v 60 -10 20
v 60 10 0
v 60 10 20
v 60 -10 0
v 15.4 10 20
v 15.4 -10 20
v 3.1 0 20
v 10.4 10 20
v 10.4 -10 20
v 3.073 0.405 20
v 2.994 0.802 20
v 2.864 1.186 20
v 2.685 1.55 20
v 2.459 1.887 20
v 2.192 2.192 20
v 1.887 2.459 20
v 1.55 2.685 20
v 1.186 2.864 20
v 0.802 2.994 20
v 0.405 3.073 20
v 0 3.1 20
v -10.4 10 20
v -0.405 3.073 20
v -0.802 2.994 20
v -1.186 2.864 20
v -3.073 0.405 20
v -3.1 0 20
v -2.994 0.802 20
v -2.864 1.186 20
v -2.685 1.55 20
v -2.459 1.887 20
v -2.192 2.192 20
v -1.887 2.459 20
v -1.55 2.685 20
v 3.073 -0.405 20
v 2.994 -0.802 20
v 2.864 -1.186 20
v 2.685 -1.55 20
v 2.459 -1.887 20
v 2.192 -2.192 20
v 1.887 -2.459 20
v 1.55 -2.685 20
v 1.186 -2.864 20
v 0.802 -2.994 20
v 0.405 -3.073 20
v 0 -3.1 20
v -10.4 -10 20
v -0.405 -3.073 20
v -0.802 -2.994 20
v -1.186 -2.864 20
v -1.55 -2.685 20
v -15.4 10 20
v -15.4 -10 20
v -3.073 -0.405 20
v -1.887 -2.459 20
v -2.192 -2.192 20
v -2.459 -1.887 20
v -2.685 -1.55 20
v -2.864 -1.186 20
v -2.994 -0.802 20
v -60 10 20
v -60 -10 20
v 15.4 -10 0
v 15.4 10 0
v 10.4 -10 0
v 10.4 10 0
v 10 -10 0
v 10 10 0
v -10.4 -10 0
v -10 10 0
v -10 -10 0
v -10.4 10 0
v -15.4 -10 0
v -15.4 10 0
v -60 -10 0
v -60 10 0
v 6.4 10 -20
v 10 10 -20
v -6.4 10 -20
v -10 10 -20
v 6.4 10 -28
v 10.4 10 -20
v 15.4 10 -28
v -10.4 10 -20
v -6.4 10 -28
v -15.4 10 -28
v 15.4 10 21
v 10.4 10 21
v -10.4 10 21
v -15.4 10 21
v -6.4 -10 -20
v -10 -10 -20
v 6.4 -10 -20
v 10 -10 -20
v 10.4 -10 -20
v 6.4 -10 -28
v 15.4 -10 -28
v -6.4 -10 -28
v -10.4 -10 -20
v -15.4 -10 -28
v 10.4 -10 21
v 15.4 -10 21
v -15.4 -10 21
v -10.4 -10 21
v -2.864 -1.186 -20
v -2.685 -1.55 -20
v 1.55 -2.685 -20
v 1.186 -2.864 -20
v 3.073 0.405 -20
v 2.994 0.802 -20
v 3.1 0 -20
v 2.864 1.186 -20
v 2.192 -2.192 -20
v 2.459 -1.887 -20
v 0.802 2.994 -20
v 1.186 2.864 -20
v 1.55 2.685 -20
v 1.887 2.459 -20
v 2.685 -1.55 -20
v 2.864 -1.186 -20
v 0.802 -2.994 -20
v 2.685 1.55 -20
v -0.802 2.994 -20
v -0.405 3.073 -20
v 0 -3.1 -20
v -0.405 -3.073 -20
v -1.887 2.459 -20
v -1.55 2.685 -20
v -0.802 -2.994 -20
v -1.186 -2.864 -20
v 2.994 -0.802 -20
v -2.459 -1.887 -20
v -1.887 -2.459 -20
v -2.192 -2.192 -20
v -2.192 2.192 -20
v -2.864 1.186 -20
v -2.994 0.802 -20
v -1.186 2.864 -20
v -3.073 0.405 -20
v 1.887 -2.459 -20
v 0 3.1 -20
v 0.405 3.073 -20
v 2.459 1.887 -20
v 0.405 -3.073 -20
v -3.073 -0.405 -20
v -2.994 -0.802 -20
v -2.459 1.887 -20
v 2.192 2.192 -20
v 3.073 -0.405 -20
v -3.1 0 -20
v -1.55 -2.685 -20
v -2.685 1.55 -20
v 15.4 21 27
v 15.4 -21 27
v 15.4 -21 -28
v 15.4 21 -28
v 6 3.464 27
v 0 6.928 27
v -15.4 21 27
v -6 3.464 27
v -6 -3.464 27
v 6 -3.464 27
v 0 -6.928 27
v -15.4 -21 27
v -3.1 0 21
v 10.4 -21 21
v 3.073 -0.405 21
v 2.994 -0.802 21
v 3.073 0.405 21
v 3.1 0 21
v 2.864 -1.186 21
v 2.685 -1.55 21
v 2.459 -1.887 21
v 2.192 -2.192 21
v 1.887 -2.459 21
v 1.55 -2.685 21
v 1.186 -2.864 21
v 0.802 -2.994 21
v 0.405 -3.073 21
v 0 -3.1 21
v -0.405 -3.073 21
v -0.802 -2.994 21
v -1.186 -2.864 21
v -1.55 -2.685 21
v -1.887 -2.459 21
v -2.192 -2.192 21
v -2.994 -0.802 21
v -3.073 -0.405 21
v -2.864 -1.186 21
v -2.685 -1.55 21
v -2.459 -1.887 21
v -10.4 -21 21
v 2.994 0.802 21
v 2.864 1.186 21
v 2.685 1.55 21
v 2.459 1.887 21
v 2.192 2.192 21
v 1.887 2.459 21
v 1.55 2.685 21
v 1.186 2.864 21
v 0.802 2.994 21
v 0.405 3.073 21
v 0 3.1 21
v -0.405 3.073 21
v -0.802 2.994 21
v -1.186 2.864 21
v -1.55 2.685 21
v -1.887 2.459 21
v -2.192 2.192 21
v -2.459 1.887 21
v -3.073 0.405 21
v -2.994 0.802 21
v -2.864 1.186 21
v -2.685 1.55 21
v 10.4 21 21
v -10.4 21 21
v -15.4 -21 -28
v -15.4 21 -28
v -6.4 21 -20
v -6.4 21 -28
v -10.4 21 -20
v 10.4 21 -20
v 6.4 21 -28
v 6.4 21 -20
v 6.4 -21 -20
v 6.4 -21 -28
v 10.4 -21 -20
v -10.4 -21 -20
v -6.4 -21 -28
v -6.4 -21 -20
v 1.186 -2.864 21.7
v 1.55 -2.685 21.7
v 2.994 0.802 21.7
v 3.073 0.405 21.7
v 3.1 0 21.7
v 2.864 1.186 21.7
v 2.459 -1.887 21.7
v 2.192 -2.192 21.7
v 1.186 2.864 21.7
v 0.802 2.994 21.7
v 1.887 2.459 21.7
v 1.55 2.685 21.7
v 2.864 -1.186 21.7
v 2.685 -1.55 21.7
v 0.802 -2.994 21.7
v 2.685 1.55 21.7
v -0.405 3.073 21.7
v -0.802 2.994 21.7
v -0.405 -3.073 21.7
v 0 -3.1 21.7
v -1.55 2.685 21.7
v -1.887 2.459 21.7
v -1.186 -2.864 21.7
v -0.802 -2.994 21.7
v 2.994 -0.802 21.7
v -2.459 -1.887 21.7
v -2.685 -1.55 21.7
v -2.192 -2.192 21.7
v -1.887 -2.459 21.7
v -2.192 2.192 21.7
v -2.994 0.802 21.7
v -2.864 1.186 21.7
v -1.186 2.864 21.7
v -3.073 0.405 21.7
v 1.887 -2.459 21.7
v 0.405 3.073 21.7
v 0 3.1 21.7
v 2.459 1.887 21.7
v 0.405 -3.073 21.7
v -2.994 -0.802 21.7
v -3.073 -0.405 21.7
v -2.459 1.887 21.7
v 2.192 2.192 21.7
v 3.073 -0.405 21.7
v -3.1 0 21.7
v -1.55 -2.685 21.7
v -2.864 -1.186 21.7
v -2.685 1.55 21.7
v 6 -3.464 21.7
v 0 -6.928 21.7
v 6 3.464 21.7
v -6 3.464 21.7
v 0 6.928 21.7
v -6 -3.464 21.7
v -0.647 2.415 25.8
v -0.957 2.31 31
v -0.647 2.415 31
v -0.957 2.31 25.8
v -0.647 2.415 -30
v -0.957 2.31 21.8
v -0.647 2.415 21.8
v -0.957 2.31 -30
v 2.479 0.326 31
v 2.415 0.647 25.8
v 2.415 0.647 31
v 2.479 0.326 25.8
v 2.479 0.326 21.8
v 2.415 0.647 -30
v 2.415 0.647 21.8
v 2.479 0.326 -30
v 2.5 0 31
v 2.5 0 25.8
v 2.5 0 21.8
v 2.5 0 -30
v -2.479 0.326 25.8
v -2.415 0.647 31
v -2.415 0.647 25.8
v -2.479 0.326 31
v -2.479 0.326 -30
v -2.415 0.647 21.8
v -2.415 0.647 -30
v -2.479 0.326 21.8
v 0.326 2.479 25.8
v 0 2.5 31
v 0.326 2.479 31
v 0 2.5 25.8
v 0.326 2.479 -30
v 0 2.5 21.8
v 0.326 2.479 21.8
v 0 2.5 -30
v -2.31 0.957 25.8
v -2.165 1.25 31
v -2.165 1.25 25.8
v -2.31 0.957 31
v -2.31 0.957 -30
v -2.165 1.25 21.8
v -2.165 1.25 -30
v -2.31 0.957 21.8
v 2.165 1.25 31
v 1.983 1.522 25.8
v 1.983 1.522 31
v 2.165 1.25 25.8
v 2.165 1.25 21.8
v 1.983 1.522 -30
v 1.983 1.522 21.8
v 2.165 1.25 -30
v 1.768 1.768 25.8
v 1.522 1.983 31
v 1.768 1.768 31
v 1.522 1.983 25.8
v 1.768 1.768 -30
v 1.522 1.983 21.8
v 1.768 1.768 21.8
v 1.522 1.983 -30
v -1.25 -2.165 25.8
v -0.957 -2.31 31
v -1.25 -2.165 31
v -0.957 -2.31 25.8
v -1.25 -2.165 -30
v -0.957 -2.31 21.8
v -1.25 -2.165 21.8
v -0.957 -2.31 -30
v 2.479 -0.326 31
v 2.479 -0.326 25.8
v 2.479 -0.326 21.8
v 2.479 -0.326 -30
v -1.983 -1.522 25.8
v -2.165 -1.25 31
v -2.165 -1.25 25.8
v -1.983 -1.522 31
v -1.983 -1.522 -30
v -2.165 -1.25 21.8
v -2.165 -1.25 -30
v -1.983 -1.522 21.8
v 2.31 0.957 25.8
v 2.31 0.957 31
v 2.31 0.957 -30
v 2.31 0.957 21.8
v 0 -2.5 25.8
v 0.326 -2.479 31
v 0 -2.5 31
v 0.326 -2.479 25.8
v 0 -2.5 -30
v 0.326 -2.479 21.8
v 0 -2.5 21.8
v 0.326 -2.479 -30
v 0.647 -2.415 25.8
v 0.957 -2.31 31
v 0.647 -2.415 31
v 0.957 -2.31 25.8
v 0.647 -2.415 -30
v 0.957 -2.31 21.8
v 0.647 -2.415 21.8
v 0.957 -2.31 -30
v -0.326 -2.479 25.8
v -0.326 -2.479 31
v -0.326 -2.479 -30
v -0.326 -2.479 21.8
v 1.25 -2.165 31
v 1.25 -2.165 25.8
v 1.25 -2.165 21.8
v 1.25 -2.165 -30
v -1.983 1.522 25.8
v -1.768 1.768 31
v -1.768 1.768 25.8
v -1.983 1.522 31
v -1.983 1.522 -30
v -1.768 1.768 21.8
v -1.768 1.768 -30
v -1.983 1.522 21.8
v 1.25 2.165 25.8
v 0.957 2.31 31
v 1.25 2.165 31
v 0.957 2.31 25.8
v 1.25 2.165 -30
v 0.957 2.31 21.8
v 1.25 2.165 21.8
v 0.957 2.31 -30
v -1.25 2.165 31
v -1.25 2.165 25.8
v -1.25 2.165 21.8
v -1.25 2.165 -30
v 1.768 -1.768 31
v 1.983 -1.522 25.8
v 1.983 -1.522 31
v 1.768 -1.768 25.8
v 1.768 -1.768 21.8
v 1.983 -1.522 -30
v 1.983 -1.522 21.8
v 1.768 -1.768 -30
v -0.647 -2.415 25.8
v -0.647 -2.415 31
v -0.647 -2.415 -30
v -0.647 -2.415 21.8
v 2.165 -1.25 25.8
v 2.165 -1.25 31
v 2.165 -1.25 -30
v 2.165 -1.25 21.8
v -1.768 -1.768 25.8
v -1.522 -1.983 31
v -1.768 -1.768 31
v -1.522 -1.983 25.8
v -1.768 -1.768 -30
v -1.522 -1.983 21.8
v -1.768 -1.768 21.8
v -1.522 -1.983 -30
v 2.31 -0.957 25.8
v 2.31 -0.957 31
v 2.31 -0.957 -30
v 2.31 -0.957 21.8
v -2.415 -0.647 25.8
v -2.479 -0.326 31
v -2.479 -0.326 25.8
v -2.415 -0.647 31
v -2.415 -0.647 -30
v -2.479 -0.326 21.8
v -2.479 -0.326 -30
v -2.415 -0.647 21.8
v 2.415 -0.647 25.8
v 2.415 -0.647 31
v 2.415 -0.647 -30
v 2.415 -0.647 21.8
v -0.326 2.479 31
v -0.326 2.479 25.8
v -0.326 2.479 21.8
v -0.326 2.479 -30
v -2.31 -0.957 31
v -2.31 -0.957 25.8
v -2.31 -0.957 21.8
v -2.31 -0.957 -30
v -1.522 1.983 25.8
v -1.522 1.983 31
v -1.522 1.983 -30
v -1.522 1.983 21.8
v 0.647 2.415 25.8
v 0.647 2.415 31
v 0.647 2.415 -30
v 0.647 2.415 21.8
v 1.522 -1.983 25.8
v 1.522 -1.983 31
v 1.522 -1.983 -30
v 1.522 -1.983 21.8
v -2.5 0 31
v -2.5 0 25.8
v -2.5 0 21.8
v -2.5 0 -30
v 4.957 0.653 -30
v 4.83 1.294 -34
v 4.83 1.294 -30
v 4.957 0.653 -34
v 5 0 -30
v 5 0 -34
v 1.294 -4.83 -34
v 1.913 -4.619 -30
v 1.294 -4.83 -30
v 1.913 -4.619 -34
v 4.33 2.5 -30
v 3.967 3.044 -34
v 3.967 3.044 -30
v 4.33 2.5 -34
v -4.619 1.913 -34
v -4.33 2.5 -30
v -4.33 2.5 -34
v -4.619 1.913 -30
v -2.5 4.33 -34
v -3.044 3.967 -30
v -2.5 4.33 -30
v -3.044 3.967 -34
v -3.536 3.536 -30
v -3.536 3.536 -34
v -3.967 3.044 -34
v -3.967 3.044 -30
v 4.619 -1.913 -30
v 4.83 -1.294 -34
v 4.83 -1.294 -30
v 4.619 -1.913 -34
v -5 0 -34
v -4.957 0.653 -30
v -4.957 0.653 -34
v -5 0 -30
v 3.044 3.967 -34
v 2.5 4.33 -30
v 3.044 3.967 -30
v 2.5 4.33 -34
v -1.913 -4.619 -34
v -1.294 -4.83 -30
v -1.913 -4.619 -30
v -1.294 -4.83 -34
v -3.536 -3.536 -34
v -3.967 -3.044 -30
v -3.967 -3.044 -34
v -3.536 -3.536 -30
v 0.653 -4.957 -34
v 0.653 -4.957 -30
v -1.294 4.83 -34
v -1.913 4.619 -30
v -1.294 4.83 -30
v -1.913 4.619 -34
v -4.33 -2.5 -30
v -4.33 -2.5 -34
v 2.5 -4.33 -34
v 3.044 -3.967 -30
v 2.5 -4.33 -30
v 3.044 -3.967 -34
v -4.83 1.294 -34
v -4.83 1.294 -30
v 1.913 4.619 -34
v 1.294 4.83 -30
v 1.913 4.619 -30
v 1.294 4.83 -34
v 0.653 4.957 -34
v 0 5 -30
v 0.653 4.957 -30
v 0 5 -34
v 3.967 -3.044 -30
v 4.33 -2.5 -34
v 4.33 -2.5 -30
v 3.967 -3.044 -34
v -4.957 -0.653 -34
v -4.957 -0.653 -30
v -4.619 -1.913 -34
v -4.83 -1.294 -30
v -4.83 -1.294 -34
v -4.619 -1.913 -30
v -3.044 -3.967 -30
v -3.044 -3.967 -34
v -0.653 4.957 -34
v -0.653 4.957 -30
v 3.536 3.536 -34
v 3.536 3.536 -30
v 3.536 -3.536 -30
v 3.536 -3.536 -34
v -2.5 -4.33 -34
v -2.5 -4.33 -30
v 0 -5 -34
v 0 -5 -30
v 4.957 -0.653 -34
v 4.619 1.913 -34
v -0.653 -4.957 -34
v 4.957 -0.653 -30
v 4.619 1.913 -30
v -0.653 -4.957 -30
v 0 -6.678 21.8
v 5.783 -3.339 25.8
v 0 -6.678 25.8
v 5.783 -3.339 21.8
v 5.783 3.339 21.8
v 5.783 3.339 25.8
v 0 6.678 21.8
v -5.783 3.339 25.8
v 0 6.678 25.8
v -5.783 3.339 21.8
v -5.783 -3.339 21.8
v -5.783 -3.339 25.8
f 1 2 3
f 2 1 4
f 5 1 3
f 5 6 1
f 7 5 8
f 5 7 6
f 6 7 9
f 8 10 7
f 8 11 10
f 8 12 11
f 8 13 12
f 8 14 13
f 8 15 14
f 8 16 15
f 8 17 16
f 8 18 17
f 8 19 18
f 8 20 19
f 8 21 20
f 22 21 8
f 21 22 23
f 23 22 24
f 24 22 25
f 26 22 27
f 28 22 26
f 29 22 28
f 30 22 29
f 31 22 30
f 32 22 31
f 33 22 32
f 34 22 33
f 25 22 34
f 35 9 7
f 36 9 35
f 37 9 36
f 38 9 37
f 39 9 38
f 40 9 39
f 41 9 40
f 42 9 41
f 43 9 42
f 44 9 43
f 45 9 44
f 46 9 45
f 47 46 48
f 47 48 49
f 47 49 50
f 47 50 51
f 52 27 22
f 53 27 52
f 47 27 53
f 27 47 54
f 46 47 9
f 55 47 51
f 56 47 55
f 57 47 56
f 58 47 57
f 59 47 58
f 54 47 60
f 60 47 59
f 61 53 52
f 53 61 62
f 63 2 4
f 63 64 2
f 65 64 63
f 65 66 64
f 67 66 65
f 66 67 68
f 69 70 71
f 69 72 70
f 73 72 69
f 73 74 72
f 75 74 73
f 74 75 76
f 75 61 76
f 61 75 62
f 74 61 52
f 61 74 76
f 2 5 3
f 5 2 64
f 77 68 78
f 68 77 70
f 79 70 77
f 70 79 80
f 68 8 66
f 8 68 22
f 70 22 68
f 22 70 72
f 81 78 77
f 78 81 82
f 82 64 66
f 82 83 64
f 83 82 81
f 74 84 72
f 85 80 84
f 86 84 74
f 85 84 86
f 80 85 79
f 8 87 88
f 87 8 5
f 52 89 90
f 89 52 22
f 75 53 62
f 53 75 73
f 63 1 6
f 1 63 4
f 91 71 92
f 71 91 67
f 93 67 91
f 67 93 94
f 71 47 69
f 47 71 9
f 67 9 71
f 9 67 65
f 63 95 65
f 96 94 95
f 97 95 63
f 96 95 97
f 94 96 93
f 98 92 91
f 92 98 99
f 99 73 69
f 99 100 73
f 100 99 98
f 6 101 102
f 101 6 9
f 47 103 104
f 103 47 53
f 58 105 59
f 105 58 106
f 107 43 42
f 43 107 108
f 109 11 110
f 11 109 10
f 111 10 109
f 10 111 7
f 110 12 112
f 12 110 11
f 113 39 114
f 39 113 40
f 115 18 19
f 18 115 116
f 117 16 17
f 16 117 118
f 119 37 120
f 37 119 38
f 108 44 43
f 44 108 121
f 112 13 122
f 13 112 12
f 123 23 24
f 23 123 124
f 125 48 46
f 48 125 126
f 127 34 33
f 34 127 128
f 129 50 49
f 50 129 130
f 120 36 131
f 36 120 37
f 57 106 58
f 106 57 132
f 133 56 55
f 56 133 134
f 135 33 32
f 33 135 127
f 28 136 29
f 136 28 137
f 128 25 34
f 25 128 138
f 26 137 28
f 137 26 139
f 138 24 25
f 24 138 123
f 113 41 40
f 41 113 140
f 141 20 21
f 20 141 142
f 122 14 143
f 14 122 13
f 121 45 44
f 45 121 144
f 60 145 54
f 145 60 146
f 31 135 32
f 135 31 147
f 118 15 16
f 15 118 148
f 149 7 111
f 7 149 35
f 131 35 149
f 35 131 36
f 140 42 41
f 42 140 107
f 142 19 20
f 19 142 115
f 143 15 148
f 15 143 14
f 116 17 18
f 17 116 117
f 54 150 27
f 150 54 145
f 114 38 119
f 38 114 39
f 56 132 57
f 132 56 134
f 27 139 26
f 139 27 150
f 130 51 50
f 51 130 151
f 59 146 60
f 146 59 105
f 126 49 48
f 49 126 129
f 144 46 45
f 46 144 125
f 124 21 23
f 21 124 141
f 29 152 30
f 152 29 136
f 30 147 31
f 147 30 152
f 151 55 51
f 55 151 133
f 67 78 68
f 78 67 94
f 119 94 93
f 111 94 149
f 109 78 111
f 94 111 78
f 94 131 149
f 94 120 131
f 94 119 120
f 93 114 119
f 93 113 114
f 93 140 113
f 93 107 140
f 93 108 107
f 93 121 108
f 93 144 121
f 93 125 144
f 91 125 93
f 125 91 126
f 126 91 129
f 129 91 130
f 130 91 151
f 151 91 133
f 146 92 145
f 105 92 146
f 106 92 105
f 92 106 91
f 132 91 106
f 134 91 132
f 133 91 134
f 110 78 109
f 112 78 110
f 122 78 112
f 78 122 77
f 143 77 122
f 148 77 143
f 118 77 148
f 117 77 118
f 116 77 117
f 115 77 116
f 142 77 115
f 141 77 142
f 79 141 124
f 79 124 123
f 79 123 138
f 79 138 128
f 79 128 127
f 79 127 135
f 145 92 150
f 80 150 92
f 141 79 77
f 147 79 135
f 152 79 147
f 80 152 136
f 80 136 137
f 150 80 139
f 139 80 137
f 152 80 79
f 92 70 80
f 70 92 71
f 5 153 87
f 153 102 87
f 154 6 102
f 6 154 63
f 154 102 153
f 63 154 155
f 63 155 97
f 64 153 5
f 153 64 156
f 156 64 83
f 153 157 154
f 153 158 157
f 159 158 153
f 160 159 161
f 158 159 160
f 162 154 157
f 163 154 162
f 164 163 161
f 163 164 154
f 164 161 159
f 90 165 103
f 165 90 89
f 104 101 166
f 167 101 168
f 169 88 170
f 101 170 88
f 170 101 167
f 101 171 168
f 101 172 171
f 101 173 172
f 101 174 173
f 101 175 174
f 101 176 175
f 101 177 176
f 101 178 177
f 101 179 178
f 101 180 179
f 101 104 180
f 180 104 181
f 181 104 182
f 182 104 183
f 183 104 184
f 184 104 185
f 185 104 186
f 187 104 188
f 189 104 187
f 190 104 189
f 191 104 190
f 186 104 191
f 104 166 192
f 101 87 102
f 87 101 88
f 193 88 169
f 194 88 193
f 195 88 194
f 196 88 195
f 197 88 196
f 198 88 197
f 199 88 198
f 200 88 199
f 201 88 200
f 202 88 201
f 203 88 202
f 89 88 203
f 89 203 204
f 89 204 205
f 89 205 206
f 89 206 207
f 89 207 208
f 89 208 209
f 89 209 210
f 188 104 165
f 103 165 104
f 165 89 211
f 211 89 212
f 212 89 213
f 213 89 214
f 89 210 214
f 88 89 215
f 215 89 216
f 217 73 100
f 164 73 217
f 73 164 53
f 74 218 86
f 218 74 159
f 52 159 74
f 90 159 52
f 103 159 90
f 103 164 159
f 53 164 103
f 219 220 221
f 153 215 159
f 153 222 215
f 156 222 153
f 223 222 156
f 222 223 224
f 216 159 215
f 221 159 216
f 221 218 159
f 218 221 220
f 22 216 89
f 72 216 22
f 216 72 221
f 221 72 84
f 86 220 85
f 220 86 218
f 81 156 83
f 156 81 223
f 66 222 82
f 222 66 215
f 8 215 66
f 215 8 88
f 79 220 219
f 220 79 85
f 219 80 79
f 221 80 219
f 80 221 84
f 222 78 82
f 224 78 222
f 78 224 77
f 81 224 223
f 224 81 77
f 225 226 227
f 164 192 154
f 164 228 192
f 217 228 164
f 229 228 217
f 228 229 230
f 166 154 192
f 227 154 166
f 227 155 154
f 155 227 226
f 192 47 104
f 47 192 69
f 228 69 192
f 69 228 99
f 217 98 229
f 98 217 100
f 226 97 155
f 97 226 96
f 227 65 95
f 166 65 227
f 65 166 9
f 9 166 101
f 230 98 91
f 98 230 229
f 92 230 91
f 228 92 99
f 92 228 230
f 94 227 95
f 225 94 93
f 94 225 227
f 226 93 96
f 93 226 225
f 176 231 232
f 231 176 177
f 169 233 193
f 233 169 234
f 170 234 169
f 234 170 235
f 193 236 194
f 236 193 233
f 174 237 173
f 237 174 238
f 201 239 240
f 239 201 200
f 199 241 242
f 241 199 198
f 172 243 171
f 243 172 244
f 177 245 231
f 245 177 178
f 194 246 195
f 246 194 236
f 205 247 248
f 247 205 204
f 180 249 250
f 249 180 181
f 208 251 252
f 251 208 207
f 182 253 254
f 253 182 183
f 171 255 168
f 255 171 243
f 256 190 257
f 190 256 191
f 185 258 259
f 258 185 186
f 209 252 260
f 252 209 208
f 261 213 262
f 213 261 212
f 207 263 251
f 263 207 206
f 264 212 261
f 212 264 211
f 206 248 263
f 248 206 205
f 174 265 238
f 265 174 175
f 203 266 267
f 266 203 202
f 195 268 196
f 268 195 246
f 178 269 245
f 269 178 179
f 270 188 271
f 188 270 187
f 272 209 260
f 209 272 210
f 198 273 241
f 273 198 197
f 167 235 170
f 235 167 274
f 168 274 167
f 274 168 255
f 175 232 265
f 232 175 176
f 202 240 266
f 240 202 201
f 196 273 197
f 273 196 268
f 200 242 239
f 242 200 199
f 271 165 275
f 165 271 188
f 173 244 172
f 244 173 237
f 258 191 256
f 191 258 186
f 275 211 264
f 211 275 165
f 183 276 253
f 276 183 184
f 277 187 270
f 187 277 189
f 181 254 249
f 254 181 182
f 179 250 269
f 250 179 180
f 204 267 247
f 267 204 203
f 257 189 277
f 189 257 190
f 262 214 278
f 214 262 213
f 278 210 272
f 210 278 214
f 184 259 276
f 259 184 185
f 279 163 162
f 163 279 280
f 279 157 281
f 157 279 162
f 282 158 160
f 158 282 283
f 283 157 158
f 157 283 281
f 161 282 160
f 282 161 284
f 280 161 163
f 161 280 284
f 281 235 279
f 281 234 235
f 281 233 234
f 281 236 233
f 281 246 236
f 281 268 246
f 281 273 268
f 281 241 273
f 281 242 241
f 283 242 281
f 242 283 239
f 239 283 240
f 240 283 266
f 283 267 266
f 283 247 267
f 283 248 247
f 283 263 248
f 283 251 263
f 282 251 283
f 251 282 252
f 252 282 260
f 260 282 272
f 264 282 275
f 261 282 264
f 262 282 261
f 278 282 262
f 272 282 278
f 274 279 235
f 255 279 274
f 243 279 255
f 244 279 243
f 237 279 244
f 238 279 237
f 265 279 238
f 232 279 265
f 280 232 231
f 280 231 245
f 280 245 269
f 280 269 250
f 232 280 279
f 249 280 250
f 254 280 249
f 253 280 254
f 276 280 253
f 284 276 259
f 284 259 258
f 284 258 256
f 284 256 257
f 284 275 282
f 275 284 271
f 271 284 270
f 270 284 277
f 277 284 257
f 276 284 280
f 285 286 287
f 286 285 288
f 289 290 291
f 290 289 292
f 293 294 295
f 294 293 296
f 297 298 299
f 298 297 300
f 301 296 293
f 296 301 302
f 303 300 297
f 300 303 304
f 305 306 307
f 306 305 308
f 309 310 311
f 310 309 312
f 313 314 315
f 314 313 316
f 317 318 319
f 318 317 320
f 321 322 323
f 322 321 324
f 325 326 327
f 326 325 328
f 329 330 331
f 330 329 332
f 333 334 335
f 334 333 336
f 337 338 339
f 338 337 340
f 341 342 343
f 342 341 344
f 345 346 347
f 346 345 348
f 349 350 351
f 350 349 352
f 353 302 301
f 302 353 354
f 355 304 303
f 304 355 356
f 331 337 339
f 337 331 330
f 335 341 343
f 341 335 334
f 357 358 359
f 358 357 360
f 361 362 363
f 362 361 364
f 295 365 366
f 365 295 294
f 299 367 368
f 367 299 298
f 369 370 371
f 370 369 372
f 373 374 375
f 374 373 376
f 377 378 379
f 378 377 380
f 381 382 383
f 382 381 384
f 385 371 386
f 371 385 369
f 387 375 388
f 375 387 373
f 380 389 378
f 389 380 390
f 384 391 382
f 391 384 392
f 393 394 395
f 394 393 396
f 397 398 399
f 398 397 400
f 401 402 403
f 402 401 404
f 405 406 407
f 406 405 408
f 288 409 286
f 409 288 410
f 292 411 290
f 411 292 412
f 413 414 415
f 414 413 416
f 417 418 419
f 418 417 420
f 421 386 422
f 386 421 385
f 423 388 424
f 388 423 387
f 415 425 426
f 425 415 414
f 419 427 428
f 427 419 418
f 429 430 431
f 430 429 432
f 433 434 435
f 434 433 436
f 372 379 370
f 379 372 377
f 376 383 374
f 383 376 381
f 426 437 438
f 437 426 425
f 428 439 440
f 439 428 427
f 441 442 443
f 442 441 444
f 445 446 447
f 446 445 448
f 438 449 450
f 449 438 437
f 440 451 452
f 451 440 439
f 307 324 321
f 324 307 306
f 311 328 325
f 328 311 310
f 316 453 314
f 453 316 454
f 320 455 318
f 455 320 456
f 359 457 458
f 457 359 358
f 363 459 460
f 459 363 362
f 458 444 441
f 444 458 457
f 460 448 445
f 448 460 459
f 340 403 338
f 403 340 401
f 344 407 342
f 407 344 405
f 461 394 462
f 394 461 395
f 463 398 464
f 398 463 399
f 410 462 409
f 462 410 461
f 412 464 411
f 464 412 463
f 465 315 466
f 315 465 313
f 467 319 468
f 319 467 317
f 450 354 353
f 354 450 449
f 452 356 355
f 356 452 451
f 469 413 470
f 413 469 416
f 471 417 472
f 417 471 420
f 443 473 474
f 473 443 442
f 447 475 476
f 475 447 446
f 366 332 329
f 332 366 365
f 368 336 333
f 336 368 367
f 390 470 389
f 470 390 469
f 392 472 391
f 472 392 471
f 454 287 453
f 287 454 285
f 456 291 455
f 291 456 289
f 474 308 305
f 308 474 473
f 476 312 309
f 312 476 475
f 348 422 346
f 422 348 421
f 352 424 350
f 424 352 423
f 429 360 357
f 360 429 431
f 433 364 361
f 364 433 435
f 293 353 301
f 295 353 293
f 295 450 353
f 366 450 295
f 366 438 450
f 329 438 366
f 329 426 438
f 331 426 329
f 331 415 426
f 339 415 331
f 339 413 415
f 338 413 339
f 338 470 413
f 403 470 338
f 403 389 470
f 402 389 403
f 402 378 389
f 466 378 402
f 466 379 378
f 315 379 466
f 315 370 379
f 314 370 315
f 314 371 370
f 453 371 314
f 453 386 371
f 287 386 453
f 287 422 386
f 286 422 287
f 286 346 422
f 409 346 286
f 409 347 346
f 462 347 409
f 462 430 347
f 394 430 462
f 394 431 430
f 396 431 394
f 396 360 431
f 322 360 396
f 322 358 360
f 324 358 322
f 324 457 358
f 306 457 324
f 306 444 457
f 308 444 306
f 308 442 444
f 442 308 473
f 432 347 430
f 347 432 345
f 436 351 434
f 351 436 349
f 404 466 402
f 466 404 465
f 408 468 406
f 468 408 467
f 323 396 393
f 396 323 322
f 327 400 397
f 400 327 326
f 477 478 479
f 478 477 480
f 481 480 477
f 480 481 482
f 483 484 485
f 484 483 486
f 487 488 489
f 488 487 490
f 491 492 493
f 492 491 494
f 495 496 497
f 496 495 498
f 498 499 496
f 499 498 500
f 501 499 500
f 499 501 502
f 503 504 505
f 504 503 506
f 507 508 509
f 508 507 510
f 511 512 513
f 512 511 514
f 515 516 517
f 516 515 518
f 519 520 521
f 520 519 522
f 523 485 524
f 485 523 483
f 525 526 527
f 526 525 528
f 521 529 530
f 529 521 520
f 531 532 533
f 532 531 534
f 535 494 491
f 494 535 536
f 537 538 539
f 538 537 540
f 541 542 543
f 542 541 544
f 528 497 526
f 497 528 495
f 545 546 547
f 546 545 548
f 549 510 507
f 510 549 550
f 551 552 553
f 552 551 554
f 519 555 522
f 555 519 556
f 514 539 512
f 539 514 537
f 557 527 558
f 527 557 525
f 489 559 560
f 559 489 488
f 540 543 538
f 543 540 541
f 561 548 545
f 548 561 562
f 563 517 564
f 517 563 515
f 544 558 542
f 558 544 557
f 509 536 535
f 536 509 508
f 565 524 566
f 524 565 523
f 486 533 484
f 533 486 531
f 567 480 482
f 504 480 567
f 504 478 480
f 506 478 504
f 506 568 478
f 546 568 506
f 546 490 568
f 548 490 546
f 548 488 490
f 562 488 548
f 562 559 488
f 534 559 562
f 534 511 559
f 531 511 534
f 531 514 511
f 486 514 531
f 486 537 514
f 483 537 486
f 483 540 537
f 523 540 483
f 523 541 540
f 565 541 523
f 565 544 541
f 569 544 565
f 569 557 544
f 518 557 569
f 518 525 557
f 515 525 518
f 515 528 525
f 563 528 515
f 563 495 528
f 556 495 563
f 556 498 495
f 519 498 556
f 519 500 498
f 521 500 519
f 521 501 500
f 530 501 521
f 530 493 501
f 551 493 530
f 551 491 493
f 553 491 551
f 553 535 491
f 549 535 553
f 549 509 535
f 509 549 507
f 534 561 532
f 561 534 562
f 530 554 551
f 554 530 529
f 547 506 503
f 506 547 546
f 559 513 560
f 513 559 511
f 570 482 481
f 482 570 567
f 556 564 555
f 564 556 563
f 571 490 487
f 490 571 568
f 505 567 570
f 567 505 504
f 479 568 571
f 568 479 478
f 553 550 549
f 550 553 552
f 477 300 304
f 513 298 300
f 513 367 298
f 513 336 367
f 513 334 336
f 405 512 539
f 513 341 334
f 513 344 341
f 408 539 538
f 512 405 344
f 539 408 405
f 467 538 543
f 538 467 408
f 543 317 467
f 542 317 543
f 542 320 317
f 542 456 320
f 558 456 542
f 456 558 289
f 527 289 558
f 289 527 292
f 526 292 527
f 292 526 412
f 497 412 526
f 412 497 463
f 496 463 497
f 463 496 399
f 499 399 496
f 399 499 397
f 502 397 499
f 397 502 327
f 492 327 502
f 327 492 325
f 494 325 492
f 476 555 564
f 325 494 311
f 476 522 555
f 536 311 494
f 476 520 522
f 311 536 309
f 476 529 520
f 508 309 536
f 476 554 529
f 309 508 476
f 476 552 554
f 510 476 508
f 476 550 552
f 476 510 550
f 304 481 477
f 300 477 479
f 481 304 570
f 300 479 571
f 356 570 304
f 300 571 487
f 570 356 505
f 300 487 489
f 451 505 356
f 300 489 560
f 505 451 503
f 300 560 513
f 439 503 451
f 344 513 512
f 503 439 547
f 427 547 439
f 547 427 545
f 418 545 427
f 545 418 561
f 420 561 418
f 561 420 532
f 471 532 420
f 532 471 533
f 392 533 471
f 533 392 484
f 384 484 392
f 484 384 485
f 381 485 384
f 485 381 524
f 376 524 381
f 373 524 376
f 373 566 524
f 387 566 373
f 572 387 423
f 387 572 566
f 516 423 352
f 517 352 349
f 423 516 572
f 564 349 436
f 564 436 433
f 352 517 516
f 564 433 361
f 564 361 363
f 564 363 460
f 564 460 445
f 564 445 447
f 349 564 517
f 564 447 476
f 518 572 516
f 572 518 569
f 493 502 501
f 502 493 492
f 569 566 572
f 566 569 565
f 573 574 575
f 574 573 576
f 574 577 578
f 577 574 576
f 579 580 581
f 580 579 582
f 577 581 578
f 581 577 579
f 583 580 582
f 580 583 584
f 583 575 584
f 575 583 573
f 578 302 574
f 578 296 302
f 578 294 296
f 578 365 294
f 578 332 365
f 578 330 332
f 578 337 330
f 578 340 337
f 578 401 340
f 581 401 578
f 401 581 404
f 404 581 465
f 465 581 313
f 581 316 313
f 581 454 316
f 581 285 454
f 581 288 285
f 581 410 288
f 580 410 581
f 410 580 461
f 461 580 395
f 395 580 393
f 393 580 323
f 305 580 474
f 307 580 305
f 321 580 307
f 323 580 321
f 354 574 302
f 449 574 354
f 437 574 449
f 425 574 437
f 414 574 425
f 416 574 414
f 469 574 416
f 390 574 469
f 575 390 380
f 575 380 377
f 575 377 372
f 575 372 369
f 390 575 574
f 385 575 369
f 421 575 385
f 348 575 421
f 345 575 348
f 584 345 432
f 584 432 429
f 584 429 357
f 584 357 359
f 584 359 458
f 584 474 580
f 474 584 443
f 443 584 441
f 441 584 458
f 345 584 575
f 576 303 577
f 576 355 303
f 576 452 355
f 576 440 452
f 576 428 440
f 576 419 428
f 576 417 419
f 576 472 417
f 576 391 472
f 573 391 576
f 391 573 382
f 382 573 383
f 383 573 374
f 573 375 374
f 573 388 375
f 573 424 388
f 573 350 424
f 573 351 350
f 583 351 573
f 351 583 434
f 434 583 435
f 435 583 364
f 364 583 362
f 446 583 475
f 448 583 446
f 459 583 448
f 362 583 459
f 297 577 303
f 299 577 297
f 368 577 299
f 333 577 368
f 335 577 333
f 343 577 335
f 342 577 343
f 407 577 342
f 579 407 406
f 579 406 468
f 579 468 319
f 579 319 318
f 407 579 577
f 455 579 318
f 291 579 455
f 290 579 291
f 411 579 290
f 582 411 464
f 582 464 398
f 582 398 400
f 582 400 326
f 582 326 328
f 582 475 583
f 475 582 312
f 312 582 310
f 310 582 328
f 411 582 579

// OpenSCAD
// Pingpang-SmartGear — one-piece double-U joint guard, v0.4
//
// Mechanical contract for this correction:
//   x = barrier long direction
//   y = front/back direction
//   z = vertical direction
//
// The printed part is ONE solid.  It contains a front U and a back U, joined
// by one printed top yoke.  The clear distance between the two U inner faces
// is exactly 20 mm.  There is no male/female printed connection and no second
// printed part to bolt together.
//
// The context tubes are the local joint envelope:
//   upper long 20x20 tube: axis x, z=0..20
//   lower perpendicular 20x20 tube: axis y, z=-20..0
// They touch at z=0 and share a vertical screw axis through their centre.

$fn = 48;

PART = "assembly_iso";

// ---------- fixed interface dimensions ----------
tube = 20;
u_inner_distance_y = 20;       // hard requirement: inner face to inner face
u_clearance_x = 0.8;           // only the x direction has initial PETG relief
u_inner_width_x = tube + u_clearance_x;
wall = 5.0;
u_outer_width_x = u_inner_width_x + 2 * wall;

front_y_inner = u_inner_distance_y / 2;
base_plate_depth_y = 7.0;
front_back_extension_y = 4.0;  // extend the complete U plate front-to-back
plate_depth_y = base_plate_depth_y + front_back_extension_y;
front_y_outer = front_y_inner + plate_depth_y;
back_y_outer = -front_y_outer;
back_y_inner = -front_y_inner;

u_bottom = -28;
u_top = 27;
top_yoke_thickness = 6.0;
hook_depth_x = 6.5;
hook_height_z = 8.0;

// Vertical screw relief.  This is a clearance hole, never a printed thread;
// the actual M4/M5 screw and nut/tapped tube remain external hardware.
screw_clearance_d = 6.2;

// Full top nut envelope.  The socket is intentionally larger than an M5 AF8
// nut and deeper than a typical 4 mm nut, so the nut cannot touch the top
// surface when the screw is tightened.
nut_pocket_af = 12.0;
nut_pocket_depth = 5.2;
nut_height = 4.0;

assert(u_inner_distance_y == 20, "双 U 内距离必须保持 20 mm");

// ---------- helpers ----------
module box_at(xc, yc, zc, sx, sy, sz) {
    translate([xc, yc, zc]) cube([sx, sy, sz], center = true);
}

module u_plate(y0, y1) {
    depth = y1 - y0;
    yc = (y0 + y1) / 2;
    left_x = -u_outer_width_x / 2 + wall / 2;
    right_x = u_outer_width_x / 2 - wall / 2;
    lip_z = u_bottom + hook_height_z / 2;
    left_lip_x = -u_outer_width_x / 2 + wall / 2 + hook_depth_x / 2;
    right_lip_x = u_outer_width_x / 2 - wall / 2 - hook_depth_x / 2;
    union() {
        // U top and two continuous arms.
        box_at(0, yc, u_top - top_yoke_thickness / 2,
               u_outer_width_x, depth, top_yoke_thickness);
        box_at(left_x, yc, (u_top + u_bottom) / 2,
               wall, depth, u_top - u_bottom);
        box_at(right_x, yc, (u_top + u_bottom) / 2,
               wall, depth, u_top - u_bottom);

        // Inward lower hooks: the actual anti-rotation retaining feature.
        box_at(left_lip_x, yc, lip_z,
               hook_depth_x, depth, hook_height_z);
        box_at(right_lip_x, yc, lip_z,
               hook_depth_x, depth, hook_height_z);

    }
}

module printed_yokes() {
    // The top yoke joins the top bridges of both U plates into one roof.
    // The lower mouths remain open so the front/back silhouettes stay U-shaped.
    box_at(0, 0, u_top - top_yoke_thickness / 2,
           u_outer_width_x, 2 * front_y_outer, top_yoke_thickness);
}

module vertical_screw_relief() {
    // Full z-axis clearance through the printed top yoke.  There is no printed
    // material in the middle gap, so this does not create a hidden horizontal
    // tunnel or a self-intersecting connector.  The screw approaches from
    // below, passes through the two tube sections, and exits this top yoke.
    translate([0, 0, (u_bottom + u_top) / 2])
        cylinder(d = screw_clearance_d,
                 h = (u_top - u_bottom) + 8,
                 center = true);

    // Hexagonal pocket opens from the top face.  Across-flats clearance is
    // deliberately generous; the remaining floor keeps the nut captured.
    translate([0, 0, u_top - nut_pocket_depth / 2])
        rotate([0, 0, 30])
            cylinder(r = nut_pocket_af / (2 * cos(30)),
                     h = nut_pocket_depth + 0.2,
                     center = true,
                     $fn = 6);
}

module double_u_clip() {
    difference() {
        union() {
            // Front U: inner face y=+10, outer face y=+21.
            u_plate(front_y_inner, front_y_outer);

            // Back U: inner face y=-10, outer face y=-21.
            u_plate(back_y_outer, back_y_inner);

            printed_yokes();
        }
        vertical_screw_relief();
    }
}

// ---------- context envelope for preview only ----------
module vertical_bore() {
    translate([0, 0, 0])
        cylinder(d = screw_clearance_d, h = 60, center = true);
}

module upper_long_tube() {
    color([0.58, 0.61, 0.66])
        difference() {
            translate([0, 0, tube / 2])
                cube([120, tube, tube], center = true);
            vertical_bore();
        }
}

module lower_cross_tube() {
    // This is the local 20 mm joint section between the two U inner faces.
    color([0.28, 0.45, 0.78])
        difference() {
            translate([0, 0, -tube / 2])
                cube([tube, u_inner_distance_y, tube], center = true);
            vertical_bore();
        }
}

module vertical_joint_screw() {
    color([0.82, 0.82, 0.84])
        translate([0, 0, 0])
            cylinder(d = 5.0, h = 62, center = true);

    // Screw head below the lower yoke.
    color([0.92, 0.70, 0.12])
        translate([0, 0, u_bottom - 4])
            cylinder(d = 10.0, h = 4.0, center = true);

    // The nut sits inside the recessed top pocket, below the top surface.
    color([0.92, 0.70, 0.12])
        translate([0, 0, u_top - nut_pocket_depth + nut_height / 2])
            rotate([0, 0, 30])
                cylinder(r = nut_pocket_af / (2 * cos(30)) - 0.25,
                         h = nut_height,
                         center = true,
                         $fn = 6);
}

module assembly_iso() {
    upper_long_tube();
    lower_cross_tube();
    color([0.96, 0.39, 0.08]) double_u_clip();
    vertical_joint_screw();
}

module assembly_section() {
    // Cut the positive-x half to expose the vertical hole and the 20 mm gap.
    intersection() {
        assembly_iso();
        translate([0, -100, -100]) cube([100, 200, 200]);
    }
}

module clip_front() {
    double_u_clip();
}

module clip_bottom() {
    double_u_clip();
}

module clip_top() {
    double_u_clip();
}

module clip_print_orientation() {
    // One-piece print orientation.  The y envelope is placed on z=0.
    translate([0, 0, front_y_outer])
        rotate([90, 0, 0]) double_u_clip();
}

if (PART == "clip") {
    double_u_clip();
} else if (PART == "clip_print_orientation") {
    clip_print_orientation();
} else if (PART == "assembly_section") {
    assembly_section();
} else if (PART == "clip_front") {
    clip_front();
} else if (PART == "clip_bottom") {
    clip_bottom();
} else if (PART == "clip_top") {
    clip_top();
} else {
    assembly_iso();
}
